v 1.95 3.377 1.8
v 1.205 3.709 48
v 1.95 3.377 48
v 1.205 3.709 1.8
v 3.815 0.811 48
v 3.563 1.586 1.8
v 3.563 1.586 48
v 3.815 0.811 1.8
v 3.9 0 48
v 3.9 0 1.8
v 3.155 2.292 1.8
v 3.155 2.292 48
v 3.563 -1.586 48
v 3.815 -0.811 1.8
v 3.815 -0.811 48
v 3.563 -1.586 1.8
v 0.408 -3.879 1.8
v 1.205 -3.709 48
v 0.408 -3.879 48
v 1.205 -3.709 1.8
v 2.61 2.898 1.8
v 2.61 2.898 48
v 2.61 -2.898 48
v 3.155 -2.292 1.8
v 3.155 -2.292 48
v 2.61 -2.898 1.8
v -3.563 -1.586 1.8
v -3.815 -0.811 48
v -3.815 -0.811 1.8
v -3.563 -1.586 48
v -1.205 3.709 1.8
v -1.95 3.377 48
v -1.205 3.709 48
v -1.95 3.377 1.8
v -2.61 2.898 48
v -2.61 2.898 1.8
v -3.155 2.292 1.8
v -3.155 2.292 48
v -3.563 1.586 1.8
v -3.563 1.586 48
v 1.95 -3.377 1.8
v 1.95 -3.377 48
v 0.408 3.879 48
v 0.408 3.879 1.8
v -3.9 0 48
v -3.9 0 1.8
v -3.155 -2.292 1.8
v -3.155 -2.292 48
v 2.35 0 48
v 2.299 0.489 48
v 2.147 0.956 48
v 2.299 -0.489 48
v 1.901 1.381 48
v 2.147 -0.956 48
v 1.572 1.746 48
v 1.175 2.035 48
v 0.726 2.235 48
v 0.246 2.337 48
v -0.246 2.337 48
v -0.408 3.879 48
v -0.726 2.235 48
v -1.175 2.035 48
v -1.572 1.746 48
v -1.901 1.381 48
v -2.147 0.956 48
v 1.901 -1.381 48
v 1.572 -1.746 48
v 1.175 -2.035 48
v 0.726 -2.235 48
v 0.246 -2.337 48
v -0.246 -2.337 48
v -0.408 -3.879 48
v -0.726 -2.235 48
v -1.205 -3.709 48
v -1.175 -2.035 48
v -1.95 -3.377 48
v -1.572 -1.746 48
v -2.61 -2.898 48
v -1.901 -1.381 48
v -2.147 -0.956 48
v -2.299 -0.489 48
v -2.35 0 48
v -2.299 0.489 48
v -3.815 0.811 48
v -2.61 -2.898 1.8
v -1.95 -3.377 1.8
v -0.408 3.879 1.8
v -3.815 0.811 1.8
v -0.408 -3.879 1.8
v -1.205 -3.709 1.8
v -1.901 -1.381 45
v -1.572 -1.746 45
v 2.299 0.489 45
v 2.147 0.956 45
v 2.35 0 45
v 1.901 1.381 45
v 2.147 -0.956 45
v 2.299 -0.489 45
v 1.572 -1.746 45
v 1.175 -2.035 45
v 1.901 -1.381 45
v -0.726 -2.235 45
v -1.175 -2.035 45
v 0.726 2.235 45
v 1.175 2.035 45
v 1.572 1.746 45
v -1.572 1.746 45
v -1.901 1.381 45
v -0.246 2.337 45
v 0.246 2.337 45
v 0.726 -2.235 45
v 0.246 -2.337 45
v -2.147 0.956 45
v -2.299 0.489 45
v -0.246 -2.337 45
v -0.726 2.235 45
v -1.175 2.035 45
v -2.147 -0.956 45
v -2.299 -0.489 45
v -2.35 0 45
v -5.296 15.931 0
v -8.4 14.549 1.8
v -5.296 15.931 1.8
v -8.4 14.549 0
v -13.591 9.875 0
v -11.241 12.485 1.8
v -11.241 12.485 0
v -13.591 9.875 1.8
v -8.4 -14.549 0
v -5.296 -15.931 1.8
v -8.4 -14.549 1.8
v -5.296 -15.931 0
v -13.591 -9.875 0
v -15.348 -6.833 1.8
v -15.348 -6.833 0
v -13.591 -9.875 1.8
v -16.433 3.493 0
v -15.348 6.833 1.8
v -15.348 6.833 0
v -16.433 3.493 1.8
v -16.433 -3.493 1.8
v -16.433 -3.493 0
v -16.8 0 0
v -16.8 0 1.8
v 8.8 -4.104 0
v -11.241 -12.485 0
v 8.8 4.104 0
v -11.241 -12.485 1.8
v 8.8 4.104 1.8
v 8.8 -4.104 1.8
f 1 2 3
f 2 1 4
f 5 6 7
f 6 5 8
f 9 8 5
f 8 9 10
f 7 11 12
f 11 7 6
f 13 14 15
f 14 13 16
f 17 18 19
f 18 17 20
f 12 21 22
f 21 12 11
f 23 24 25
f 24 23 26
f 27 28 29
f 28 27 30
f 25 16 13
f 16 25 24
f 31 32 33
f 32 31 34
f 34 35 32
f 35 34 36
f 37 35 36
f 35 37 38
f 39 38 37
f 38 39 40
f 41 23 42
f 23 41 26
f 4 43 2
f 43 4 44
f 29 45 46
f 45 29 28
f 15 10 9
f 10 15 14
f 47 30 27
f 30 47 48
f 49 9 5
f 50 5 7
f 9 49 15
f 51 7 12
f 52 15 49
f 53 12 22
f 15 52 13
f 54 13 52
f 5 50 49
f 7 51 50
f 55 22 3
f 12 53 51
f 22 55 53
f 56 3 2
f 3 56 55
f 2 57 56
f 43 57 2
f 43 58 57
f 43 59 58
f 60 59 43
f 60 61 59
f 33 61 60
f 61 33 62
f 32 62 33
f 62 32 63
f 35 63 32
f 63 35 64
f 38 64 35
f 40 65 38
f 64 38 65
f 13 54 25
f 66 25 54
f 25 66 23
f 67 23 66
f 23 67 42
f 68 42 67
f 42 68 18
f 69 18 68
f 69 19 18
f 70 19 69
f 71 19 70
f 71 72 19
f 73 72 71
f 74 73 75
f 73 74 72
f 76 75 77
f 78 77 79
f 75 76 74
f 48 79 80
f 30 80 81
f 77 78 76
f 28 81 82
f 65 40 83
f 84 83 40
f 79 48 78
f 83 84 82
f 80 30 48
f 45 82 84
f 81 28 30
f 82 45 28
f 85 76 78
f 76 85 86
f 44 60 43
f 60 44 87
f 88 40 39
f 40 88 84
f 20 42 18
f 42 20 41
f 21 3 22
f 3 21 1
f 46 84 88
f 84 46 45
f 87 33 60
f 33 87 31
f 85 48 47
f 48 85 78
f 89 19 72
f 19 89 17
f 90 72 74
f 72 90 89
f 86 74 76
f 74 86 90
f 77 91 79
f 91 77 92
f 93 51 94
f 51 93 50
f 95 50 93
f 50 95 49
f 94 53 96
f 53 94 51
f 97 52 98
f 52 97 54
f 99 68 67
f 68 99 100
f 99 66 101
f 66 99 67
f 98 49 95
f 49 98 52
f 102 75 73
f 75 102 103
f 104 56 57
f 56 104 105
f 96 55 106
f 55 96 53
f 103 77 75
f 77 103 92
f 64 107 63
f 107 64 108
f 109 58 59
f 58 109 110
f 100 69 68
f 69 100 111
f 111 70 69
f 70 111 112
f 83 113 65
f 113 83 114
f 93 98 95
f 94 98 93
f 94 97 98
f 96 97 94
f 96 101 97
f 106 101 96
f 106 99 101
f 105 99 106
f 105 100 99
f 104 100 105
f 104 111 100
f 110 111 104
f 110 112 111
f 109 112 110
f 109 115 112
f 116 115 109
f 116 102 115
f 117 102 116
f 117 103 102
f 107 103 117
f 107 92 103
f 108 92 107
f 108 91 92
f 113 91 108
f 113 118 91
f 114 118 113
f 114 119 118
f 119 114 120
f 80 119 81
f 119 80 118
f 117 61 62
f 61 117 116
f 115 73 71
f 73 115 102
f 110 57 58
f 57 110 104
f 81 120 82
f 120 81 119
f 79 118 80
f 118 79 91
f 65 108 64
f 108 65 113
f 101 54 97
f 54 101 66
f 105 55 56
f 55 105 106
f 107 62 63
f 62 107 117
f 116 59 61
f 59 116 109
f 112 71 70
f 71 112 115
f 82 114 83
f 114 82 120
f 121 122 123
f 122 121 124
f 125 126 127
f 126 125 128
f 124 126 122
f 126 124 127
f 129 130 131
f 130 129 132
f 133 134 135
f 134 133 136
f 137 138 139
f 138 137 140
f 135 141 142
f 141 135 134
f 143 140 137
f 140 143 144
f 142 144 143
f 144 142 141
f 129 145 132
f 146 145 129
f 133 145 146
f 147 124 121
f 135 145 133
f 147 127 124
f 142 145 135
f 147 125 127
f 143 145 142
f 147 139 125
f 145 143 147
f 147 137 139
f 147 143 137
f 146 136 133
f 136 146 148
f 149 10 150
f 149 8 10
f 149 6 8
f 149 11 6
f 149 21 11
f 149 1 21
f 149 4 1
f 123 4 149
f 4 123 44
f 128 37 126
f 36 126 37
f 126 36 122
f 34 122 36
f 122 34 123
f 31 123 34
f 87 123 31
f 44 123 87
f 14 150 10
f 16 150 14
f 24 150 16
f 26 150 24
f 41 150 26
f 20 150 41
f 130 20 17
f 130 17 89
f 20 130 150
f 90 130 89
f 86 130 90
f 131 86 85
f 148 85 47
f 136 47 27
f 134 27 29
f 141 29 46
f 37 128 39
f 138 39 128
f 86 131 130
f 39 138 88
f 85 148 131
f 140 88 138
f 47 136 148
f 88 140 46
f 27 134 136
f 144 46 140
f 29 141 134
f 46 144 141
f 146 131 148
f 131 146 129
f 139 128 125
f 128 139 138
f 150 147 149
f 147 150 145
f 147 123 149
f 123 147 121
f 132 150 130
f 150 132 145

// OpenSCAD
// file: sluice_defs.scad
unit_width = 44;
sluice_thickness = 2;
sluice_width = unit_width * 4 / 5;
sluice_height = sluice_width;
sluice_clearance = 0.2;
wall_thickness = 5;
sluice_retain = 2;
// Offset of the horn center of rotation;
horn_cor_offset = 5;
oring_dia = 0.5;
stem_dia = 8;
cup_height = 4;
// main file
include <sluice_defs.scad>

module sluice_gate() {
     cleared_width = unit_width - 2 * (wall_thickness + sluice_clearance);
     thicc = sluice_thickness - sluice_clearance;

     // Main body of the sluice
     difference() {
          $fs=0.5;
          union() {
               cylinder(d=cleared_width, h = thicc);
               cylinder(d=stem_dia - sluice_clearance, h=unit_width + horn_cor_offset - wall_thickness);
               // Top cup geometry
               translate([0, 0, unit_width + horn_cor_offset - wall_thickness])
                    difference() {
                        cylinder(d=stem_dia - sluice_clearance, h=cup_height);
                        translate([0, 0, 1])
                        cylinder(d=4.7, h=cup_height+0.01);
                    }
          }

          #translate([-stem_dia + cleared_width / 2, -cleared_width / 2, -0.01])
               cube([cleared_width, cleared_width, 100]);

          rotate([0, 0, 50])
          #translate([-stem_dia + cleared_width / 2, -cleared_width / 2, -0.01])
               cube([cleared_width, cleared_width, 100]);

          rotate([0, 0, -50])
          #translate([-stem_dia + cleared_width / 2, -cleared_width / 2, -0.01])
               cube([cleared_width, cleared_width, 100]);
     }
}

sluice_gate();
